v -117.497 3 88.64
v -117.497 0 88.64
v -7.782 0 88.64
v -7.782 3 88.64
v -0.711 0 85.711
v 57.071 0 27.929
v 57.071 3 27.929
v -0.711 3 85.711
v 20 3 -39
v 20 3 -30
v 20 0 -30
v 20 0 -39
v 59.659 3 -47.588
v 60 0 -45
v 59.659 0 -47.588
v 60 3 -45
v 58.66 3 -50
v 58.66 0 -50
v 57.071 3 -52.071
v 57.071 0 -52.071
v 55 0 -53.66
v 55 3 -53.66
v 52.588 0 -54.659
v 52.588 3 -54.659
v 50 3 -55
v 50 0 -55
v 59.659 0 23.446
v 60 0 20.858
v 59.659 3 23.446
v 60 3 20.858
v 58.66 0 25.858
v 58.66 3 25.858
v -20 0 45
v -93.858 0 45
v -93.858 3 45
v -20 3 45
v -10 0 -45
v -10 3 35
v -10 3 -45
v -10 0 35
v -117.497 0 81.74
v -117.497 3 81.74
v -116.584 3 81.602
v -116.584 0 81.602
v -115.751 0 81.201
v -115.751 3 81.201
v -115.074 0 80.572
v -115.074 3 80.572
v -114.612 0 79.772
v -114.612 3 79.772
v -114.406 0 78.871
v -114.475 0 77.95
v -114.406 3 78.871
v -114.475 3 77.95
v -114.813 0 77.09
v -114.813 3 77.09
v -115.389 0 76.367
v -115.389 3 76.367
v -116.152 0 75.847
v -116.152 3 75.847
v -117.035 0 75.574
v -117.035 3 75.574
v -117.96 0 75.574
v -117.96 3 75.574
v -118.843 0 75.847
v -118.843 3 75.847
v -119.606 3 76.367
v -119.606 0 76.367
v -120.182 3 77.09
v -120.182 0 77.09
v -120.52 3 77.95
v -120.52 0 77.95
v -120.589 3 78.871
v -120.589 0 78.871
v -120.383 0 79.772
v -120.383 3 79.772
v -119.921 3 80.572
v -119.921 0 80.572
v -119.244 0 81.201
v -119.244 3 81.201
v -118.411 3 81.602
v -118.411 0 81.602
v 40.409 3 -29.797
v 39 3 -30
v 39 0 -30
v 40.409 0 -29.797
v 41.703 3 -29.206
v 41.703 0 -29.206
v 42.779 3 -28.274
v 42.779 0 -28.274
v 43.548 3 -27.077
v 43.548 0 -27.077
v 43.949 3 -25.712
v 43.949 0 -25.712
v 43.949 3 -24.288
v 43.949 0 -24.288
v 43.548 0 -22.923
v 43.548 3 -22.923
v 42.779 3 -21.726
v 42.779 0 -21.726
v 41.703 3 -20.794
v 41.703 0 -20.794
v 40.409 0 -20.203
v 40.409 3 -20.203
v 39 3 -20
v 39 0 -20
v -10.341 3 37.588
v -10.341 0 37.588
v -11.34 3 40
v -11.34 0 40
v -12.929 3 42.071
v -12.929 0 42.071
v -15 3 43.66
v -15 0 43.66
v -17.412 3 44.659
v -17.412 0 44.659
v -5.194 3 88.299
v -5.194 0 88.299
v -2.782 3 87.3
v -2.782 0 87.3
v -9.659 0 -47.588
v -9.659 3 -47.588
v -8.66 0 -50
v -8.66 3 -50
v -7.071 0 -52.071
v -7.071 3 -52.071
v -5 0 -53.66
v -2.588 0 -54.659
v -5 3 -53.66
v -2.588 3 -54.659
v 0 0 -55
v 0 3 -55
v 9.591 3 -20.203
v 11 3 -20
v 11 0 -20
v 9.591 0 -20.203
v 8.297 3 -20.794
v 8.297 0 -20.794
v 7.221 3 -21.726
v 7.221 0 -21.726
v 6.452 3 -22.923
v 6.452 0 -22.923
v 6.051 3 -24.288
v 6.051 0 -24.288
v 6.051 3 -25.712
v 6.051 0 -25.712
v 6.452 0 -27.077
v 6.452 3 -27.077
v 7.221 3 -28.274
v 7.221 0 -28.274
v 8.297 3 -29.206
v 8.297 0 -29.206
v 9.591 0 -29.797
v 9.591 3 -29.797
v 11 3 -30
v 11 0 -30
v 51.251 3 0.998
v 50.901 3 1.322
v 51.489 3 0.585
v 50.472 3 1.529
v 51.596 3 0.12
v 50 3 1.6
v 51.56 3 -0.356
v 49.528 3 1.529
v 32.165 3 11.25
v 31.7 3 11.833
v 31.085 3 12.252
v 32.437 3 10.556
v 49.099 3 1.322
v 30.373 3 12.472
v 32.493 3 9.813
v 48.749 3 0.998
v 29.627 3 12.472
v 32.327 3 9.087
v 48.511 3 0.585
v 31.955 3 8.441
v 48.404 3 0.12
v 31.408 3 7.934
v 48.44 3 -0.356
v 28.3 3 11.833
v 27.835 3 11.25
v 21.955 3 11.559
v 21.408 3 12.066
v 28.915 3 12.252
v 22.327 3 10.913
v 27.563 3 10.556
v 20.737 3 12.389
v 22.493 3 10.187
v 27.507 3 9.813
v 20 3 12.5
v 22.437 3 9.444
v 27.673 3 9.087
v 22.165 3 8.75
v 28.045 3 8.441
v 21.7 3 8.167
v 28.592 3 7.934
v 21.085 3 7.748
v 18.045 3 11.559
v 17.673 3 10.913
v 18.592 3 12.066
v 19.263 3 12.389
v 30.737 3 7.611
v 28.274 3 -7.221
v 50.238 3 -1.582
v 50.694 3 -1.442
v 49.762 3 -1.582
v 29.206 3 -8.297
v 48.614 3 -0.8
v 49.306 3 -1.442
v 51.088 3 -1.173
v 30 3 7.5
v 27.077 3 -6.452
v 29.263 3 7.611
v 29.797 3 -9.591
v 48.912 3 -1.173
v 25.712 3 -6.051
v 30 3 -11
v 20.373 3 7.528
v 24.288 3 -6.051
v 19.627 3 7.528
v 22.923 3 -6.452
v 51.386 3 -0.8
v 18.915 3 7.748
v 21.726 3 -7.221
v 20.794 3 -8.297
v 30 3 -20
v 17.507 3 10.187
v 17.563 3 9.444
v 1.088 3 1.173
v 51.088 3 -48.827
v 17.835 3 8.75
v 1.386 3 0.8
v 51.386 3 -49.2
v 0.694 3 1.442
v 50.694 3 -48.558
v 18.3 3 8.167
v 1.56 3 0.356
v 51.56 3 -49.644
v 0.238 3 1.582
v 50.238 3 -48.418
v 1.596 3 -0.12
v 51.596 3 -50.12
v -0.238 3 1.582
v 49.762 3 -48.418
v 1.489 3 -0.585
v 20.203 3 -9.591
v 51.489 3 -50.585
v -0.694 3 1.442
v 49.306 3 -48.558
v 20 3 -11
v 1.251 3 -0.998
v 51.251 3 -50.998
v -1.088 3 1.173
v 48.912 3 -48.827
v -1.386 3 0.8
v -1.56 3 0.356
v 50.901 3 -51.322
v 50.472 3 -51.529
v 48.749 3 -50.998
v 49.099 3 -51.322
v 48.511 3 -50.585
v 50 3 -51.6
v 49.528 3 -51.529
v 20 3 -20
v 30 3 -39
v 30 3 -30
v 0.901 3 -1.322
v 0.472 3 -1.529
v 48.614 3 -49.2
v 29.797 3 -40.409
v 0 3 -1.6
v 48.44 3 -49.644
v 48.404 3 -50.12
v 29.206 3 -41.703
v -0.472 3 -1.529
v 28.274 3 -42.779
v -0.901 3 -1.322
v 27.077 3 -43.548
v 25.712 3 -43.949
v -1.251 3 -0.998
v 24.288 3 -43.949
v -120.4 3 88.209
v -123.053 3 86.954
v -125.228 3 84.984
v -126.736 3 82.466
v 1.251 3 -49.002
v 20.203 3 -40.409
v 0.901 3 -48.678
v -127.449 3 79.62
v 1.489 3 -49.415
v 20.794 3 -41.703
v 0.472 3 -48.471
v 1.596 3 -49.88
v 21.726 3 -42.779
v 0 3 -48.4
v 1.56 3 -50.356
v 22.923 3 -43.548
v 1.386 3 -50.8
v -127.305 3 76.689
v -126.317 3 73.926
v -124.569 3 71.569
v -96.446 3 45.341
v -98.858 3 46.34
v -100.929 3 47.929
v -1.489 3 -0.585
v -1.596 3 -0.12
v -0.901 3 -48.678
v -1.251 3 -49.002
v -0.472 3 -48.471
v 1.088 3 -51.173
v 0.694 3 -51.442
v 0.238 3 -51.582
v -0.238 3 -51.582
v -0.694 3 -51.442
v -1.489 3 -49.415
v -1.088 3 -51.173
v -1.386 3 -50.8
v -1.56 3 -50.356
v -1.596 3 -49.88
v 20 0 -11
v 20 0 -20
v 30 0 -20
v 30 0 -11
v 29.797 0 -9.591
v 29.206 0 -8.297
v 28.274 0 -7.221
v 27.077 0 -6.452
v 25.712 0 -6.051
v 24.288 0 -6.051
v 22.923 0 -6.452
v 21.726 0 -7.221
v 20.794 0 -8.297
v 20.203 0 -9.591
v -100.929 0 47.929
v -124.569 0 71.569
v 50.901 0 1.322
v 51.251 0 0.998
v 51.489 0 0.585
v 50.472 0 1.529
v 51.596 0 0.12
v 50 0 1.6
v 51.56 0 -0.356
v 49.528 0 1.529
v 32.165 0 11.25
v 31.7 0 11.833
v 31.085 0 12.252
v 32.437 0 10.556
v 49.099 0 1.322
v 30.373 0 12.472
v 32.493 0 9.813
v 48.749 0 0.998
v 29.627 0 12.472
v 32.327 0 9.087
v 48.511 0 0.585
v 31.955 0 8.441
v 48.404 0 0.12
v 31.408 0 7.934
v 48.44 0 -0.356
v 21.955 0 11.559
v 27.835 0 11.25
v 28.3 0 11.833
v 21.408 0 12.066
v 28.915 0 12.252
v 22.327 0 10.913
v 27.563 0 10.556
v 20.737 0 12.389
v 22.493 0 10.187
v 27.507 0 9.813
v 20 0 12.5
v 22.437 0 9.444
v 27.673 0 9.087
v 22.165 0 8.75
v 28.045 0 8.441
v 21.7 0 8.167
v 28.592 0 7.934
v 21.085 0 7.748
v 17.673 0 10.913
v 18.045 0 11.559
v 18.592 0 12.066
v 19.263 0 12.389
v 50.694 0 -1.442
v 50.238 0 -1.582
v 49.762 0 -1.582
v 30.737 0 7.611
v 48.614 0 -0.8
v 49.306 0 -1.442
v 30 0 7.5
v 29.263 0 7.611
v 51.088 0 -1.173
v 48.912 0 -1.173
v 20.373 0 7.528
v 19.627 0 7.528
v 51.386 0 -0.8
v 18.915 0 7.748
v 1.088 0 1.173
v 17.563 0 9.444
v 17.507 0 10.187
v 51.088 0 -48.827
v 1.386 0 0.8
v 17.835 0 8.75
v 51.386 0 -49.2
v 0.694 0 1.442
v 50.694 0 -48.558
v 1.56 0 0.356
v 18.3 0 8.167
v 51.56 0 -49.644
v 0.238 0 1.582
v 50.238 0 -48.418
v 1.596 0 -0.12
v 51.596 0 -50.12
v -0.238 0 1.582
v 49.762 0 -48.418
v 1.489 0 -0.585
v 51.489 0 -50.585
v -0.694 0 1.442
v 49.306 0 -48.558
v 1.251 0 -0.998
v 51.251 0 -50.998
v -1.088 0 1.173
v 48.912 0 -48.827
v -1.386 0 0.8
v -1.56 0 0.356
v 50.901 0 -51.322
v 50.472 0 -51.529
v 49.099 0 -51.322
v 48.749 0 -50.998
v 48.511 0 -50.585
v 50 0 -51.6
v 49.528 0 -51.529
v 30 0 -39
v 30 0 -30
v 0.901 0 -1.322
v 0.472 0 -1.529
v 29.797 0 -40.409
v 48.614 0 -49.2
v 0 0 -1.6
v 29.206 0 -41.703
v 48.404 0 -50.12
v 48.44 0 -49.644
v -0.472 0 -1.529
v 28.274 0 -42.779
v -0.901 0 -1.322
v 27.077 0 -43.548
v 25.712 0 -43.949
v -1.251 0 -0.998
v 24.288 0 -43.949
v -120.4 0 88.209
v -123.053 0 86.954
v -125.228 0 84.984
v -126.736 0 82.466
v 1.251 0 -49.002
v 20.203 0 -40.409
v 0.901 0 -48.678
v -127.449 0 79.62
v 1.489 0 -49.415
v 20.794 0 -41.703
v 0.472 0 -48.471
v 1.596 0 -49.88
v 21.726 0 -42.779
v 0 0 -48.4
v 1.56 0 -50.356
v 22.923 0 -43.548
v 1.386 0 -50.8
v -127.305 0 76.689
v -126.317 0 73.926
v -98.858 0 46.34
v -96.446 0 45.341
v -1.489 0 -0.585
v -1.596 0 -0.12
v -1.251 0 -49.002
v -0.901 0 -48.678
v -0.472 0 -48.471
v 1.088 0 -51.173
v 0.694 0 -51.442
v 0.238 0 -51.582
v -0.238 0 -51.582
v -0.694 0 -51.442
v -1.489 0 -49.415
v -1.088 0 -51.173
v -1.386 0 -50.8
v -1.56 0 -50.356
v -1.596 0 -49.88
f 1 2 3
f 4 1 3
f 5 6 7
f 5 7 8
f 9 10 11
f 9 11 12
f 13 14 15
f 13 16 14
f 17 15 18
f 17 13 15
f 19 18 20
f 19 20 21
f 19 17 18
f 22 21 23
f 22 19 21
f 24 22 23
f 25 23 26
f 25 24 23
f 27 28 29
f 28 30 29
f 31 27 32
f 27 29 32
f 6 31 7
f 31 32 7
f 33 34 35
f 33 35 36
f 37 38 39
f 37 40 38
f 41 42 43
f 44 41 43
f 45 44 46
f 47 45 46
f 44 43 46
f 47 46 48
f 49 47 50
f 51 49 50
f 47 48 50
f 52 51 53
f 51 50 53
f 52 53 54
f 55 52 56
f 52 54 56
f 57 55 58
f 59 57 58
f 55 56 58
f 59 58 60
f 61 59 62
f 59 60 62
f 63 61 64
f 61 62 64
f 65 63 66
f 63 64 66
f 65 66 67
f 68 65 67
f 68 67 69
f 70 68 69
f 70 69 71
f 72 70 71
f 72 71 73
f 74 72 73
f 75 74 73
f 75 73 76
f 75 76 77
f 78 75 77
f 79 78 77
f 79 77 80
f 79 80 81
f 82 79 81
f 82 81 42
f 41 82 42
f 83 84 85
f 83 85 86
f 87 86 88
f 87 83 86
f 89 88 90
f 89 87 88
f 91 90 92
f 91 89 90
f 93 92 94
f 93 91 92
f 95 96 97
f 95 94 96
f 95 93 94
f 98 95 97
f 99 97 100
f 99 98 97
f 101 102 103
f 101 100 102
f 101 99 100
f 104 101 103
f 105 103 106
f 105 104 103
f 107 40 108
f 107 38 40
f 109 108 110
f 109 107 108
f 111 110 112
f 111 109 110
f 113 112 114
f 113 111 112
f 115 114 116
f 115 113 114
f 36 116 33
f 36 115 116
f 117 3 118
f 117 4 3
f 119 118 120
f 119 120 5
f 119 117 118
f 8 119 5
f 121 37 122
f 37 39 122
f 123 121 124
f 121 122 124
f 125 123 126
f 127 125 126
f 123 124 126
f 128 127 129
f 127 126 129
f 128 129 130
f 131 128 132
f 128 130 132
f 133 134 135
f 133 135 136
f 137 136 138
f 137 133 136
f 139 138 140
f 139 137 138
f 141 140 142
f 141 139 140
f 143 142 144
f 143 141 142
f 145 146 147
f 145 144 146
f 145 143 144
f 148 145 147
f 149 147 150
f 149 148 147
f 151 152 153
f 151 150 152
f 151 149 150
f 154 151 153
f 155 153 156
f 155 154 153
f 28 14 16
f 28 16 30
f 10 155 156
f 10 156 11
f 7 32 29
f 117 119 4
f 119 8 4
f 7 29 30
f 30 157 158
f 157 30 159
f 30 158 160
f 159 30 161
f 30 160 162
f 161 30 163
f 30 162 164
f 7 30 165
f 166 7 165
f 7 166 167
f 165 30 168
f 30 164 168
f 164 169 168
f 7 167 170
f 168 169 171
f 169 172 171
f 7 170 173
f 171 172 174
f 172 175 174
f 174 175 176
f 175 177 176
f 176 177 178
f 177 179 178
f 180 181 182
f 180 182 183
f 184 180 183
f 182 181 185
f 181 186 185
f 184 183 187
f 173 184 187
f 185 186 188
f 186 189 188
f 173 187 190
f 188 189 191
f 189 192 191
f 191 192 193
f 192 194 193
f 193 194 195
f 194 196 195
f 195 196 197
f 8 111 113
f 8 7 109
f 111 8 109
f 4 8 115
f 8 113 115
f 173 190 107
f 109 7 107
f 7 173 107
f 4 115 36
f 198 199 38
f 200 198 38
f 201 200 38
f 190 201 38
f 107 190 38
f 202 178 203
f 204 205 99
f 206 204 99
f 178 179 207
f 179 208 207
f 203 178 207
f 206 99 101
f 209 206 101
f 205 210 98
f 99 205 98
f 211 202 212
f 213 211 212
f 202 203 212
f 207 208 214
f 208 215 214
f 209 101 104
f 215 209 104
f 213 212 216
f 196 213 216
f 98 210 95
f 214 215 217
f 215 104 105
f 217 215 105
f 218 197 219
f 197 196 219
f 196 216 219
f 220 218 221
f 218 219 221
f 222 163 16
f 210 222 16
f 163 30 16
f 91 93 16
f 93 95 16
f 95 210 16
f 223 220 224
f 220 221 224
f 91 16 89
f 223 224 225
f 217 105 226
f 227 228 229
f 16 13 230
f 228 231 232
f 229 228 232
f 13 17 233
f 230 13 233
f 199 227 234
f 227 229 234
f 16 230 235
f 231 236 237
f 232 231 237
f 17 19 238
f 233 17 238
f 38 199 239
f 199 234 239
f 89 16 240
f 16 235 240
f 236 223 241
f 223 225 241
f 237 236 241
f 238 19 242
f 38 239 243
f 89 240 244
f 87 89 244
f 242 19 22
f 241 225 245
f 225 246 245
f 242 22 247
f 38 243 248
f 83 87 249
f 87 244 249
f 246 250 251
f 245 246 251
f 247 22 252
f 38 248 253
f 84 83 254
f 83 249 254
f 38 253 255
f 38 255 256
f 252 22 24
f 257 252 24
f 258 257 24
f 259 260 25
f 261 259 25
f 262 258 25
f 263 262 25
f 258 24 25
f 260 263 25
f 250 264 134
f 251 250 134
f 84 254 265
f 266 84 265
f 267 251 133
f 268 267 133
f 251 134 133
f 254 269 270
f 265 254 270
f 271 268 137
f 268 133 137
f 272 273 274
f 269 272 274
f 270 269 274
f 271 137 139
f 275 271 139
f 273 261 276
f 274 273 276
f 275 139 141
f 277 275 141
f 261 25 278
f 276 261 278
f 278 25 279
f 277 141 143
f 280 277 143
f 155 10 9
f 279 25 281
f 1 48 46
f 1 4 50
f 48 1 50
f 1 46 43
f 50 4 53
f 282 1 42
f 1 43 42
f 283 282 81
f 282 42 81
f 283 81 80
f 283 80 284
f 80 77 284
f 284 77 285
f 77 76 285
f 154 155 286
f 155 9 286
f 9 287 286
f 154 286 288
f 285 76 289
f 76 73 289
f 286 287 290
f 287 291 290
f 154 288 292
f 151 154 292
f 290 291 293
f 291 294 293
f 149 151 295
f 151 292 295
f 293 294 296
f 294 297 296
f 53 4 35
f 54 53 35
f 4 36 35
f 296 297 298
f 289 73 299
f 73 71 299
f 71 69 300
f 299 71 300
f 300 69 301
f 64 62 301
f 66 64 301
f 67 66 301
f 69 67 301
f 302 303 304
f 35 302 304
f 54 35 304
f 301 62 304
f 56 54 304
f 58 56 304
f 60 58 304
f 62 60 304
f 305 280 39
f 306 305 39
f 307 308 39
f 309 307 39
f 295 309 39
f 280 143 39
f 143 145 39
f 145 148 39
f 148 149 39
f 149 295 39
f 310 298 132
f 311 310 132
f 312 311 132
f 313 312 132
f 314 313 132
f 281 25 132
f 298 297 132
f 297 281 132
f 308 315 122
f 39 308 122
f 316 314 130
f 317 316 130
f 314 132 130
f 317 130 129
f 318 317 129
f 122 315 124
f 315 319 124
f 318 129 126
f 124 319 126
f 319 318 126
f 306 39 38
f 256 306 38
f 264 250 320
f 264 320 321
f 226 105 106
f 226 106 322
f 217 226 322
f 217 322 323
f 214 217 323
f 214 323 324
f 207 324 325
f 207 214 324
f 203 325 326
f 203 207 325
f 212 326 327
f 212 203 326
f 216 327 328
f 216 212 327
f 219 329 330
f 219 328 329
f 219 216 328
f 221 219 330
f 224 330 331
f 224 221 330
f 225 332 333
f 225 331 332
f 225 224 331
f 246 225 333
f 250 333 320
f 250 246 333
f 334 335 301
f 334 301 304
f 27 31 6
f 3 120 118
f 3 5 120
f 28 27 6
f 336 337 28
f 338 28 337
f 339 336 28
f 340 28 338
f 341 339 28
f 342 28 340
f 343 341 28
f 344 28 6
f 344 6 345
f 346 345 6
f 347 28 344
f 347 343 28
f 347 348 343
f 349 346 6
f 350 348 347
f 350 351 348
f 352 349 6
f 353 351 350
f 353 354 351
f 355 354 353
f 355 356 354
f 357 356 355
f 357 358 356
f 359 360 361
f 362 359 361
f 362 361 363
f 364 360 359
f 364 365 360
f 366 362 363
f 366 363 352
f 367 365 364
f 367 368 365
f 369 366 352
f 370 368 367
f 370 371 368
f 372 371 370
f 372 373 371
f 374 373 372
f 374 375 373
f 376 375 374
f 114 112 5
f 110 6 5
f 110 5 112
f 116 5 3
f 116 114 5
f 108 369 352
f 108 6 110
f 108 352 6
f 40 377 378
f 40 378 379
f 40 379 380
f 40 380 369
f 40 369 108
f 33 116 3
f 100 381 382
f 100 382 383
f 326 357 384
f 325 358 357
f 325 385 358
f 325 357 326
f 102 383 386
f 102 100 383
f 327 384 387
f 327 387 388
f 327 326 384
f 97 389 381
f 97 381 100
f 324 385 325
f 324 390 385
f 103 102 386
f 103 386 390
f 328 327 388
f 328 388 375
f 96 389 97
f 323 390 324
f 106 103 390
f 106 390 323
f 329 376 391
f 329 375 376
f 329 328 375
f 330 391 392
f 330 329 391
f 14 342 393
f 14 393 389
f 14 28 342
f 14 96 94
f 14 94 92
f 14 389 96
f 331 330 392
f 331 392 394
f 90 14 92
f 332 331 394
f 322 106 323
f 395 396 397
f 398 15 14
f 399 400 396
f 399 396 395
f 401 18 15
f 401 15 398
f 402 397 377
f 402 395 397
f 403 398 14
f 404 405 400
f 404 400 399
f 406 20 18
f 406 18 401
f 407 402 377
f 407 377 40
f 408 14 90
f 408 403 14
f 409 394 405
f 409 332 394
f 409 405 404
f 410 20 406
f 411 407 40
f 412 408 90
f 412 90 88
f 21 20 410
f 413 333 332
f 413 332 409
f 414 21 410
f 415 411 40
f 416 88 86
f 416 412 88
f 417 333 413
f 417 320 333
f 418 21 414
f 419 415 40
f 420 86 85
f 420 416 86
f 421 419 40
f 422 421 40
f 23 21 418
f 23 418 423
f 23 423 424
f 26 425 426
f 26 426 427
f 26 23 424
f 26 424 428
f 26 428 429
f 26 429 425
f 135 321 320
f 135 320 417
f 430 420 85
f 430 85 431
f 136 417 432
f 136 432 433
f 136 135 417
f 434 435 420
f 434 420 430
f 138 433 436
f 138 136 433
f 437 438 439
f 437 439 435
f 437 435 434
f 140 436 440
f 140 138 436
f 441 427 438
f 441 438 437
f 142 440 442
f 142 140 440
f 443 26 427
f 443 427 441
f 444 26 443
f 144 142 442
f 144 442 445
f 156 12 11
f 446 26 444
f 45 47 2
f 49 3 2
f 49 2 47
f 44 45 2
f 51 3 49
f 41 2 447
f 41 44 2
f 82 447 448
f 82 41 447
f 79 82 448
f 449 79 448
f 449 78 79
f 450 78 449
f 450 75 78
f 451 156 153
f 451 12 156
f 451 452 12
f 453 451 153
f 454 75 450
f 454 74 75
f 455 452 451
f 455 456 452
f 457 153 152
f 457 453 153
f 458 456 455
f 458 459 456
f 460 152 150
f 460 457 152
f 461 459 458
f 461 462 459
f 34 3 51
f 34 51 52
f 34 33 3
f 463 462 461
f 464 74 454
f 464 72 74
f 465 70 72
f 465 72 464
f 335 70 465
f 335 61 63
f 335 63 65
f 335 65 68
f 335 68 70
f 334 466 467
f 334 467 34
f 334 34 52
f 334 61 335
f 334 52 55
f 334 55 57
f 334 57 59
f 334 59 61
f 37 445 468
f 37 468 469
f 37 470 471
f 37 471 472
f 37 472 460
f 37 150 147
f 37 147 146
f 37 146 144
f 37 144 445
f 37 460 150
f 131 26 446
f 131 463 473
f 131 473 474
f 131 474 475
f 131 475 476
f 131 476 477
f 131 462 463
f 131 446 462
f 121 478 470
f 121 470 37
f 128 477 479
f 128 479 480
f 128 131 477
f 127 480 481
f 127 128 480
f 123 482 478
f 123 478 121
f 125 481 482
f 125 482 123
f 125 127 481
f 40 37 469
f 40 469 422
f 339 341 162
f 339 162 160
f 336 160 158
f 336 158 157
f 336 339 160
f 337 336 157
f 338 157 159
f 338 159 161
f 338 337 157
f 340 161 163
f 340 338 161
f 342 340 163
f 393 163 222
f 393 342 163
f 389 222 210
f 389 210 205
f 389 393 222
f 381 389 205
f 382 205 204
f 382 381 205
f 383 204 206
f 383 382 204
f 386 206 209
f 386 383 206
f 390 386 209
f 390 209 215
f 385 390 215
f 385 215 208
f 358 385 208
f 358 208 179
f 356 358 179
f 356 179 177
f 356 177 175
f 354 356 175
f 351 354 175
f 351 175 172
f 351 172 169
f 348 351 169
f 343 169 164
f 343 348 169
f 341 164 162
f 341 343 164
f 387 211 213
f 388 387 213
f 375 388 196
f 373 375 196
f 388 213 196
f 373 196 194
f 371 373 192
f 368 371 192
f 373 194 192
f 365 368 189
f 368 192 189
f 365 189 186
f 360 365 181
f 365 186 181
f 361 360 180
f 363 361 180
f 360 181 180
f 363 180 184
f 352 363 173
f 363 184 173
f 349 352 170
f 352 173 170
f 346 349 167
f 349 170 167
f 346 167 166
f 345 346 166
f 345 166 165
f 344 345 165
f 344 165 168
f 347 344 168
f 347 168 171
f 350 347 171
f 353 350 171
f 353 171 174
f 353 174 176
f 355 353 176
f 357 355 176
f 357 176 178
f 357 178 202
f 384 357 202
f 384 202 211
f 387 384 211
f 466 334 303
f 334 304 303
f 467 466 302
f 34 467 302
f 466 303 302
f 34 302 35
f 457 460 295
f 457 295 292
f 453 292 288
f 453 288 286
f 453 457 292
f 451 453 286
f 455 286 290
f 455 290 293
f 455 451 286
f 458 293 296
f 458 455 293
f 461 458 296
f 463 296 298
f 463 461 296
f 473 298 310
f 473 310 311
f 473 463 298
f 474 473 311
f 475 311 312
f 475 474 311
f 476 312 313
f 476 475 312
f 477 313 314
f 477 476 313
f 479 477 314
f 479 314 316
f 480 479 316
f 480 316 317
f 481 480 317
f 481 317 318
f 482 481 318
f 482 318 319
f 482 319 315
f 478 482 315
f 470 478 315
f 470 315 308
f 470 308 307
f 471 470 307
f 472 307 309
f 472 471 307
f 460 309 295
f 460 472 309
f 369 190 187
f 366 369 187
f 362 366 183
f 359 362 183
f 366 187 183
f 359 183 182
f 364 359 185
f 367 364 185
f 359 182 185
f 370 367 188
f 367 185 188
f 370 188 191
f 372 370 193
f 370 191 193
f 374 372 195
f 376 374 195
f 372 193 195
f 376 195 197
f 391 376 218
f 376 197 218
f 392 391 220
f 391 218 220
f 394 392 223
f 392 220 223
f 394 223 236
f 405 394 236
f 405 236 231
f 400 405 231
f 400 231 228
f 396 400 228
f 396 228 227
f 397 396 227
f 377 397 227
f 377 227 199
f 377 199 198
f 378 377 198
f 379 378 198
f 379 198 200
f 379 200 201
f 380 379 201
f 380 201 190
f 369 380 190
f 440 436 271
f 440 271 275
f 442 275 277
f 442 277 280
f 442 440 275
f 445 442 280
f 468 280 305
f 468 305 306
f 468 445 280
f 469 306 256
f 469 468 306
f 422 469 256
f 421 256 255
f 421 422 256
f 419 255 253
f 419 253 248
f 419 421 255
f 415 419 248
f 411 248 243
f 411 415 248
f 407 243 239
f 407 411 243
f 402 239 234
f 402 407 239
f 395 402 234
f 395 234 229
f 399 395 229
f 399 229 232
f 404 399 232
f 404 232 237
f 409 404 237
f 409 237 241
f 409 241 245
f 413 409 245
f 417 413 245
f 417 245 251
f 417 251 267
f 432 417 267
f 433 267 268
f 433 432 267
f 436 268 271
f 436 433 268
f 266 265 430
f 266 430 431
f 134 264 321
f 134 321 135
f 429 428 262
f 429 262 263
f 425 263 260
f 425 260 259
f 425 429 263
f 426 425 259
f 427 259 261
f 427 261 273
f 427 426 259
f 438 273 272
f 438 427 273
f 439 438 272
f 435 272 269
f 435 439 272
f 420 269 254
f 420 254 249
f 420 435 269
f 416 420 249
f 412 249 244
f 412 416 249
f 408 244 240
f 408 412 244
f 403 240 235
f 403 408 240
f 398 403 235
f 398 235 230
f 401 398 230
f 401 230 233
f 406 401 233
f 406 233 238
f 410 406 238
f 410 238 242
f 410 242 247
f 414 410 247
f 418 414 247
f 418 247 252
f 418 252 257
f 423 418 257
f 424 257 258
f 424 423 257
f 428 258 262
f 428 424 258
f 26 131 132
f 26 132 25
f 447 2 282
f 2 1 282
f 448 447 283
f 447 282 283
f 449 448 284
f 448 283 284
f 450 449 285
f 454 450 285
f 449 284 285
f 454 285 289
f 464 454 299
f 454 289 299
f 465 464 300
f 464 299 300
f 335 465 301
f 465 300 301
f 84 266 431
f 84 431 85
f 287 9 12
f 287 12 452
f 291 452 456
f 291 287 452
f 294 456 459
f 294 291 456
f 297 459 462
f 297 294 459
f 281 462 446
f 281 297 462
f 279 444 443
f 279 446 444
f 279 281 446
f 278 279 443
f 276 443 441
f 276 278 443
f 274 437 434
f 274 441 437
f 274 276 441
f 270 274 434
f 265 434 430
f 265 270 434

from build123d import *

# Parameters (mm, degrees)
SKETCH_1_W          = 70
SKETCH_1_H          = 60
SKETCH_1_R          = 1.6
EXTRUDE_1_DEPTH     = 3
EXTRUDE_2_DEPTH     = 3
FILLET_1_R          = 10
FILLET_3_R          = 10
SKETCH_4_R          = 3.1
CUT_EXTRUDE_1_DEPTH = 10
SKETCH_5_R          = 2.5
CUT_EXTRUDE_2_DEPTH = 156.311257048


with BuildPart() as part:
    # 草图1 → 凸台-拉伸1 (new body)
    with BuildSketch(Plane(origin=(0, 0, 0), x_dir=(1, 0, 0), z_dir=(0, 1, 0))):
        with Locations((25, 25)):
            Rectangle(SKETCH_1_W, SKETCH_1_H)
        with Locations(Location((0, 50, 0), (0, 0, 270))):
            Circle(SKETCH_1_R, mode=Mode.SUBTRACT)
        with Locations(Location((50, 50, 0), (0, 0, 90))):
            Circle(SKETCH_1_R, mode=Mode.SUBTRACT)
        with Locations(Location((50, 0, 0), (0, 0, 270))):
            Circle(SKETCH_1_R, mode=Mode.SUBTRACT)
        with Locations(Location((0, 0, 0), (0, 0, 90))):
            Circle(SKETCH_1_R, mode=Mode.SUBTRACT)
    extrude(amount=EXTRUDE_1_DEPTH)

    # 草图2 → 凸台-拉伸2 (add)
    with BuildSketch(Plane(origin=(0, 0, 0), x_dir=(1, 0, 0), z_dir=(0, 1, 0))):
        Polygon((-10, -5), (60, -5), (60, -25), (-3.639610307, -88.639610307), (-58.172444533, -88.639610307), (-141.639610307, -88.639610307), (-98, -45), (-10, -45), align=None)
    extrude(amount=EXTRUDE_2_DEPTH)

    # 圆角1
    fillet_1_edges = [part.edges().sort_by_distance(p)[0] for p in [
        (-10, 1.5, 45),
        (-3.639610307, 1.5, 88.639610307),
        (60, 1.5, 25),
        (-10, 1.5, -55),
        (60, 1.5, -55),
    ]]
    fillet(fillet_1_edges, radius=FILLET_1_R)

    # 圆角3
    fillet_3_edges = [part.edges().sort_by_distance(p)[0] for p in [
        (-98, 1.5, 45),
        (-141.639610307, 1.5, 88.639610307),
    ]]
    fillet(fillet_3_edges, radius=FILLET_3_R)

    # 草图4 → 切除-拉伸1 (cut)
    with BuildSketch(Plane(origin=(0, 3, 0), x_dir=(1, 0, 0), z_dir=(0, 1, 0))):
        with Locations(Location((-117.497474683, -78.639610307, 0), (0, 0, 270))):
            Circle(SKETCH_4_R)
    extrude(amount=-CUT_EXTRUDE_1_DEPTH, mode=Mode.SUBTRACT)

    # 草图5 → 切除-拉伸2 (cut, through all)
    with BuildSketch(Plane(origin=(0, 3, 0), x_dir=(1, 0, 0), z_dir=(0, 1, 0))):
        with Locations(Location((20, -10, 0), (0, 0, 270))):
            Circle(SKETCH_5_R)
        with Locations(Location((30, -10, 0), (0, 0, 90))):
            Circle(SKETCH_5_R)
        with BuildLine():
            Line((11, 30), (20, 30))
            Line((20, 30), (20, 39))
            ThreePointArc((20, 39), (25, 44), (30, 39))
            Line((30, 39), (30, 30))
            Line((30, 30), (39, 30))
            ThreePointArc((39, 30), (44, 25), (39, 20))
            Line((39, 20), (30, 20))
            Line((30, 20), (30, 11))
            ThreePointArc((30, 11), (25, 6), (20, 11))
            Line((20, 11), (20, 20))
            Line((20, 20), (11, 20))
            ThreePointArc((11, 20), (6, 25), (11, 30))
        make_face()
    extrude(amount=-CUT_EXTRUDE_2_DEPTH, mode=Mode.SUBTRACT)


solid = part.part
